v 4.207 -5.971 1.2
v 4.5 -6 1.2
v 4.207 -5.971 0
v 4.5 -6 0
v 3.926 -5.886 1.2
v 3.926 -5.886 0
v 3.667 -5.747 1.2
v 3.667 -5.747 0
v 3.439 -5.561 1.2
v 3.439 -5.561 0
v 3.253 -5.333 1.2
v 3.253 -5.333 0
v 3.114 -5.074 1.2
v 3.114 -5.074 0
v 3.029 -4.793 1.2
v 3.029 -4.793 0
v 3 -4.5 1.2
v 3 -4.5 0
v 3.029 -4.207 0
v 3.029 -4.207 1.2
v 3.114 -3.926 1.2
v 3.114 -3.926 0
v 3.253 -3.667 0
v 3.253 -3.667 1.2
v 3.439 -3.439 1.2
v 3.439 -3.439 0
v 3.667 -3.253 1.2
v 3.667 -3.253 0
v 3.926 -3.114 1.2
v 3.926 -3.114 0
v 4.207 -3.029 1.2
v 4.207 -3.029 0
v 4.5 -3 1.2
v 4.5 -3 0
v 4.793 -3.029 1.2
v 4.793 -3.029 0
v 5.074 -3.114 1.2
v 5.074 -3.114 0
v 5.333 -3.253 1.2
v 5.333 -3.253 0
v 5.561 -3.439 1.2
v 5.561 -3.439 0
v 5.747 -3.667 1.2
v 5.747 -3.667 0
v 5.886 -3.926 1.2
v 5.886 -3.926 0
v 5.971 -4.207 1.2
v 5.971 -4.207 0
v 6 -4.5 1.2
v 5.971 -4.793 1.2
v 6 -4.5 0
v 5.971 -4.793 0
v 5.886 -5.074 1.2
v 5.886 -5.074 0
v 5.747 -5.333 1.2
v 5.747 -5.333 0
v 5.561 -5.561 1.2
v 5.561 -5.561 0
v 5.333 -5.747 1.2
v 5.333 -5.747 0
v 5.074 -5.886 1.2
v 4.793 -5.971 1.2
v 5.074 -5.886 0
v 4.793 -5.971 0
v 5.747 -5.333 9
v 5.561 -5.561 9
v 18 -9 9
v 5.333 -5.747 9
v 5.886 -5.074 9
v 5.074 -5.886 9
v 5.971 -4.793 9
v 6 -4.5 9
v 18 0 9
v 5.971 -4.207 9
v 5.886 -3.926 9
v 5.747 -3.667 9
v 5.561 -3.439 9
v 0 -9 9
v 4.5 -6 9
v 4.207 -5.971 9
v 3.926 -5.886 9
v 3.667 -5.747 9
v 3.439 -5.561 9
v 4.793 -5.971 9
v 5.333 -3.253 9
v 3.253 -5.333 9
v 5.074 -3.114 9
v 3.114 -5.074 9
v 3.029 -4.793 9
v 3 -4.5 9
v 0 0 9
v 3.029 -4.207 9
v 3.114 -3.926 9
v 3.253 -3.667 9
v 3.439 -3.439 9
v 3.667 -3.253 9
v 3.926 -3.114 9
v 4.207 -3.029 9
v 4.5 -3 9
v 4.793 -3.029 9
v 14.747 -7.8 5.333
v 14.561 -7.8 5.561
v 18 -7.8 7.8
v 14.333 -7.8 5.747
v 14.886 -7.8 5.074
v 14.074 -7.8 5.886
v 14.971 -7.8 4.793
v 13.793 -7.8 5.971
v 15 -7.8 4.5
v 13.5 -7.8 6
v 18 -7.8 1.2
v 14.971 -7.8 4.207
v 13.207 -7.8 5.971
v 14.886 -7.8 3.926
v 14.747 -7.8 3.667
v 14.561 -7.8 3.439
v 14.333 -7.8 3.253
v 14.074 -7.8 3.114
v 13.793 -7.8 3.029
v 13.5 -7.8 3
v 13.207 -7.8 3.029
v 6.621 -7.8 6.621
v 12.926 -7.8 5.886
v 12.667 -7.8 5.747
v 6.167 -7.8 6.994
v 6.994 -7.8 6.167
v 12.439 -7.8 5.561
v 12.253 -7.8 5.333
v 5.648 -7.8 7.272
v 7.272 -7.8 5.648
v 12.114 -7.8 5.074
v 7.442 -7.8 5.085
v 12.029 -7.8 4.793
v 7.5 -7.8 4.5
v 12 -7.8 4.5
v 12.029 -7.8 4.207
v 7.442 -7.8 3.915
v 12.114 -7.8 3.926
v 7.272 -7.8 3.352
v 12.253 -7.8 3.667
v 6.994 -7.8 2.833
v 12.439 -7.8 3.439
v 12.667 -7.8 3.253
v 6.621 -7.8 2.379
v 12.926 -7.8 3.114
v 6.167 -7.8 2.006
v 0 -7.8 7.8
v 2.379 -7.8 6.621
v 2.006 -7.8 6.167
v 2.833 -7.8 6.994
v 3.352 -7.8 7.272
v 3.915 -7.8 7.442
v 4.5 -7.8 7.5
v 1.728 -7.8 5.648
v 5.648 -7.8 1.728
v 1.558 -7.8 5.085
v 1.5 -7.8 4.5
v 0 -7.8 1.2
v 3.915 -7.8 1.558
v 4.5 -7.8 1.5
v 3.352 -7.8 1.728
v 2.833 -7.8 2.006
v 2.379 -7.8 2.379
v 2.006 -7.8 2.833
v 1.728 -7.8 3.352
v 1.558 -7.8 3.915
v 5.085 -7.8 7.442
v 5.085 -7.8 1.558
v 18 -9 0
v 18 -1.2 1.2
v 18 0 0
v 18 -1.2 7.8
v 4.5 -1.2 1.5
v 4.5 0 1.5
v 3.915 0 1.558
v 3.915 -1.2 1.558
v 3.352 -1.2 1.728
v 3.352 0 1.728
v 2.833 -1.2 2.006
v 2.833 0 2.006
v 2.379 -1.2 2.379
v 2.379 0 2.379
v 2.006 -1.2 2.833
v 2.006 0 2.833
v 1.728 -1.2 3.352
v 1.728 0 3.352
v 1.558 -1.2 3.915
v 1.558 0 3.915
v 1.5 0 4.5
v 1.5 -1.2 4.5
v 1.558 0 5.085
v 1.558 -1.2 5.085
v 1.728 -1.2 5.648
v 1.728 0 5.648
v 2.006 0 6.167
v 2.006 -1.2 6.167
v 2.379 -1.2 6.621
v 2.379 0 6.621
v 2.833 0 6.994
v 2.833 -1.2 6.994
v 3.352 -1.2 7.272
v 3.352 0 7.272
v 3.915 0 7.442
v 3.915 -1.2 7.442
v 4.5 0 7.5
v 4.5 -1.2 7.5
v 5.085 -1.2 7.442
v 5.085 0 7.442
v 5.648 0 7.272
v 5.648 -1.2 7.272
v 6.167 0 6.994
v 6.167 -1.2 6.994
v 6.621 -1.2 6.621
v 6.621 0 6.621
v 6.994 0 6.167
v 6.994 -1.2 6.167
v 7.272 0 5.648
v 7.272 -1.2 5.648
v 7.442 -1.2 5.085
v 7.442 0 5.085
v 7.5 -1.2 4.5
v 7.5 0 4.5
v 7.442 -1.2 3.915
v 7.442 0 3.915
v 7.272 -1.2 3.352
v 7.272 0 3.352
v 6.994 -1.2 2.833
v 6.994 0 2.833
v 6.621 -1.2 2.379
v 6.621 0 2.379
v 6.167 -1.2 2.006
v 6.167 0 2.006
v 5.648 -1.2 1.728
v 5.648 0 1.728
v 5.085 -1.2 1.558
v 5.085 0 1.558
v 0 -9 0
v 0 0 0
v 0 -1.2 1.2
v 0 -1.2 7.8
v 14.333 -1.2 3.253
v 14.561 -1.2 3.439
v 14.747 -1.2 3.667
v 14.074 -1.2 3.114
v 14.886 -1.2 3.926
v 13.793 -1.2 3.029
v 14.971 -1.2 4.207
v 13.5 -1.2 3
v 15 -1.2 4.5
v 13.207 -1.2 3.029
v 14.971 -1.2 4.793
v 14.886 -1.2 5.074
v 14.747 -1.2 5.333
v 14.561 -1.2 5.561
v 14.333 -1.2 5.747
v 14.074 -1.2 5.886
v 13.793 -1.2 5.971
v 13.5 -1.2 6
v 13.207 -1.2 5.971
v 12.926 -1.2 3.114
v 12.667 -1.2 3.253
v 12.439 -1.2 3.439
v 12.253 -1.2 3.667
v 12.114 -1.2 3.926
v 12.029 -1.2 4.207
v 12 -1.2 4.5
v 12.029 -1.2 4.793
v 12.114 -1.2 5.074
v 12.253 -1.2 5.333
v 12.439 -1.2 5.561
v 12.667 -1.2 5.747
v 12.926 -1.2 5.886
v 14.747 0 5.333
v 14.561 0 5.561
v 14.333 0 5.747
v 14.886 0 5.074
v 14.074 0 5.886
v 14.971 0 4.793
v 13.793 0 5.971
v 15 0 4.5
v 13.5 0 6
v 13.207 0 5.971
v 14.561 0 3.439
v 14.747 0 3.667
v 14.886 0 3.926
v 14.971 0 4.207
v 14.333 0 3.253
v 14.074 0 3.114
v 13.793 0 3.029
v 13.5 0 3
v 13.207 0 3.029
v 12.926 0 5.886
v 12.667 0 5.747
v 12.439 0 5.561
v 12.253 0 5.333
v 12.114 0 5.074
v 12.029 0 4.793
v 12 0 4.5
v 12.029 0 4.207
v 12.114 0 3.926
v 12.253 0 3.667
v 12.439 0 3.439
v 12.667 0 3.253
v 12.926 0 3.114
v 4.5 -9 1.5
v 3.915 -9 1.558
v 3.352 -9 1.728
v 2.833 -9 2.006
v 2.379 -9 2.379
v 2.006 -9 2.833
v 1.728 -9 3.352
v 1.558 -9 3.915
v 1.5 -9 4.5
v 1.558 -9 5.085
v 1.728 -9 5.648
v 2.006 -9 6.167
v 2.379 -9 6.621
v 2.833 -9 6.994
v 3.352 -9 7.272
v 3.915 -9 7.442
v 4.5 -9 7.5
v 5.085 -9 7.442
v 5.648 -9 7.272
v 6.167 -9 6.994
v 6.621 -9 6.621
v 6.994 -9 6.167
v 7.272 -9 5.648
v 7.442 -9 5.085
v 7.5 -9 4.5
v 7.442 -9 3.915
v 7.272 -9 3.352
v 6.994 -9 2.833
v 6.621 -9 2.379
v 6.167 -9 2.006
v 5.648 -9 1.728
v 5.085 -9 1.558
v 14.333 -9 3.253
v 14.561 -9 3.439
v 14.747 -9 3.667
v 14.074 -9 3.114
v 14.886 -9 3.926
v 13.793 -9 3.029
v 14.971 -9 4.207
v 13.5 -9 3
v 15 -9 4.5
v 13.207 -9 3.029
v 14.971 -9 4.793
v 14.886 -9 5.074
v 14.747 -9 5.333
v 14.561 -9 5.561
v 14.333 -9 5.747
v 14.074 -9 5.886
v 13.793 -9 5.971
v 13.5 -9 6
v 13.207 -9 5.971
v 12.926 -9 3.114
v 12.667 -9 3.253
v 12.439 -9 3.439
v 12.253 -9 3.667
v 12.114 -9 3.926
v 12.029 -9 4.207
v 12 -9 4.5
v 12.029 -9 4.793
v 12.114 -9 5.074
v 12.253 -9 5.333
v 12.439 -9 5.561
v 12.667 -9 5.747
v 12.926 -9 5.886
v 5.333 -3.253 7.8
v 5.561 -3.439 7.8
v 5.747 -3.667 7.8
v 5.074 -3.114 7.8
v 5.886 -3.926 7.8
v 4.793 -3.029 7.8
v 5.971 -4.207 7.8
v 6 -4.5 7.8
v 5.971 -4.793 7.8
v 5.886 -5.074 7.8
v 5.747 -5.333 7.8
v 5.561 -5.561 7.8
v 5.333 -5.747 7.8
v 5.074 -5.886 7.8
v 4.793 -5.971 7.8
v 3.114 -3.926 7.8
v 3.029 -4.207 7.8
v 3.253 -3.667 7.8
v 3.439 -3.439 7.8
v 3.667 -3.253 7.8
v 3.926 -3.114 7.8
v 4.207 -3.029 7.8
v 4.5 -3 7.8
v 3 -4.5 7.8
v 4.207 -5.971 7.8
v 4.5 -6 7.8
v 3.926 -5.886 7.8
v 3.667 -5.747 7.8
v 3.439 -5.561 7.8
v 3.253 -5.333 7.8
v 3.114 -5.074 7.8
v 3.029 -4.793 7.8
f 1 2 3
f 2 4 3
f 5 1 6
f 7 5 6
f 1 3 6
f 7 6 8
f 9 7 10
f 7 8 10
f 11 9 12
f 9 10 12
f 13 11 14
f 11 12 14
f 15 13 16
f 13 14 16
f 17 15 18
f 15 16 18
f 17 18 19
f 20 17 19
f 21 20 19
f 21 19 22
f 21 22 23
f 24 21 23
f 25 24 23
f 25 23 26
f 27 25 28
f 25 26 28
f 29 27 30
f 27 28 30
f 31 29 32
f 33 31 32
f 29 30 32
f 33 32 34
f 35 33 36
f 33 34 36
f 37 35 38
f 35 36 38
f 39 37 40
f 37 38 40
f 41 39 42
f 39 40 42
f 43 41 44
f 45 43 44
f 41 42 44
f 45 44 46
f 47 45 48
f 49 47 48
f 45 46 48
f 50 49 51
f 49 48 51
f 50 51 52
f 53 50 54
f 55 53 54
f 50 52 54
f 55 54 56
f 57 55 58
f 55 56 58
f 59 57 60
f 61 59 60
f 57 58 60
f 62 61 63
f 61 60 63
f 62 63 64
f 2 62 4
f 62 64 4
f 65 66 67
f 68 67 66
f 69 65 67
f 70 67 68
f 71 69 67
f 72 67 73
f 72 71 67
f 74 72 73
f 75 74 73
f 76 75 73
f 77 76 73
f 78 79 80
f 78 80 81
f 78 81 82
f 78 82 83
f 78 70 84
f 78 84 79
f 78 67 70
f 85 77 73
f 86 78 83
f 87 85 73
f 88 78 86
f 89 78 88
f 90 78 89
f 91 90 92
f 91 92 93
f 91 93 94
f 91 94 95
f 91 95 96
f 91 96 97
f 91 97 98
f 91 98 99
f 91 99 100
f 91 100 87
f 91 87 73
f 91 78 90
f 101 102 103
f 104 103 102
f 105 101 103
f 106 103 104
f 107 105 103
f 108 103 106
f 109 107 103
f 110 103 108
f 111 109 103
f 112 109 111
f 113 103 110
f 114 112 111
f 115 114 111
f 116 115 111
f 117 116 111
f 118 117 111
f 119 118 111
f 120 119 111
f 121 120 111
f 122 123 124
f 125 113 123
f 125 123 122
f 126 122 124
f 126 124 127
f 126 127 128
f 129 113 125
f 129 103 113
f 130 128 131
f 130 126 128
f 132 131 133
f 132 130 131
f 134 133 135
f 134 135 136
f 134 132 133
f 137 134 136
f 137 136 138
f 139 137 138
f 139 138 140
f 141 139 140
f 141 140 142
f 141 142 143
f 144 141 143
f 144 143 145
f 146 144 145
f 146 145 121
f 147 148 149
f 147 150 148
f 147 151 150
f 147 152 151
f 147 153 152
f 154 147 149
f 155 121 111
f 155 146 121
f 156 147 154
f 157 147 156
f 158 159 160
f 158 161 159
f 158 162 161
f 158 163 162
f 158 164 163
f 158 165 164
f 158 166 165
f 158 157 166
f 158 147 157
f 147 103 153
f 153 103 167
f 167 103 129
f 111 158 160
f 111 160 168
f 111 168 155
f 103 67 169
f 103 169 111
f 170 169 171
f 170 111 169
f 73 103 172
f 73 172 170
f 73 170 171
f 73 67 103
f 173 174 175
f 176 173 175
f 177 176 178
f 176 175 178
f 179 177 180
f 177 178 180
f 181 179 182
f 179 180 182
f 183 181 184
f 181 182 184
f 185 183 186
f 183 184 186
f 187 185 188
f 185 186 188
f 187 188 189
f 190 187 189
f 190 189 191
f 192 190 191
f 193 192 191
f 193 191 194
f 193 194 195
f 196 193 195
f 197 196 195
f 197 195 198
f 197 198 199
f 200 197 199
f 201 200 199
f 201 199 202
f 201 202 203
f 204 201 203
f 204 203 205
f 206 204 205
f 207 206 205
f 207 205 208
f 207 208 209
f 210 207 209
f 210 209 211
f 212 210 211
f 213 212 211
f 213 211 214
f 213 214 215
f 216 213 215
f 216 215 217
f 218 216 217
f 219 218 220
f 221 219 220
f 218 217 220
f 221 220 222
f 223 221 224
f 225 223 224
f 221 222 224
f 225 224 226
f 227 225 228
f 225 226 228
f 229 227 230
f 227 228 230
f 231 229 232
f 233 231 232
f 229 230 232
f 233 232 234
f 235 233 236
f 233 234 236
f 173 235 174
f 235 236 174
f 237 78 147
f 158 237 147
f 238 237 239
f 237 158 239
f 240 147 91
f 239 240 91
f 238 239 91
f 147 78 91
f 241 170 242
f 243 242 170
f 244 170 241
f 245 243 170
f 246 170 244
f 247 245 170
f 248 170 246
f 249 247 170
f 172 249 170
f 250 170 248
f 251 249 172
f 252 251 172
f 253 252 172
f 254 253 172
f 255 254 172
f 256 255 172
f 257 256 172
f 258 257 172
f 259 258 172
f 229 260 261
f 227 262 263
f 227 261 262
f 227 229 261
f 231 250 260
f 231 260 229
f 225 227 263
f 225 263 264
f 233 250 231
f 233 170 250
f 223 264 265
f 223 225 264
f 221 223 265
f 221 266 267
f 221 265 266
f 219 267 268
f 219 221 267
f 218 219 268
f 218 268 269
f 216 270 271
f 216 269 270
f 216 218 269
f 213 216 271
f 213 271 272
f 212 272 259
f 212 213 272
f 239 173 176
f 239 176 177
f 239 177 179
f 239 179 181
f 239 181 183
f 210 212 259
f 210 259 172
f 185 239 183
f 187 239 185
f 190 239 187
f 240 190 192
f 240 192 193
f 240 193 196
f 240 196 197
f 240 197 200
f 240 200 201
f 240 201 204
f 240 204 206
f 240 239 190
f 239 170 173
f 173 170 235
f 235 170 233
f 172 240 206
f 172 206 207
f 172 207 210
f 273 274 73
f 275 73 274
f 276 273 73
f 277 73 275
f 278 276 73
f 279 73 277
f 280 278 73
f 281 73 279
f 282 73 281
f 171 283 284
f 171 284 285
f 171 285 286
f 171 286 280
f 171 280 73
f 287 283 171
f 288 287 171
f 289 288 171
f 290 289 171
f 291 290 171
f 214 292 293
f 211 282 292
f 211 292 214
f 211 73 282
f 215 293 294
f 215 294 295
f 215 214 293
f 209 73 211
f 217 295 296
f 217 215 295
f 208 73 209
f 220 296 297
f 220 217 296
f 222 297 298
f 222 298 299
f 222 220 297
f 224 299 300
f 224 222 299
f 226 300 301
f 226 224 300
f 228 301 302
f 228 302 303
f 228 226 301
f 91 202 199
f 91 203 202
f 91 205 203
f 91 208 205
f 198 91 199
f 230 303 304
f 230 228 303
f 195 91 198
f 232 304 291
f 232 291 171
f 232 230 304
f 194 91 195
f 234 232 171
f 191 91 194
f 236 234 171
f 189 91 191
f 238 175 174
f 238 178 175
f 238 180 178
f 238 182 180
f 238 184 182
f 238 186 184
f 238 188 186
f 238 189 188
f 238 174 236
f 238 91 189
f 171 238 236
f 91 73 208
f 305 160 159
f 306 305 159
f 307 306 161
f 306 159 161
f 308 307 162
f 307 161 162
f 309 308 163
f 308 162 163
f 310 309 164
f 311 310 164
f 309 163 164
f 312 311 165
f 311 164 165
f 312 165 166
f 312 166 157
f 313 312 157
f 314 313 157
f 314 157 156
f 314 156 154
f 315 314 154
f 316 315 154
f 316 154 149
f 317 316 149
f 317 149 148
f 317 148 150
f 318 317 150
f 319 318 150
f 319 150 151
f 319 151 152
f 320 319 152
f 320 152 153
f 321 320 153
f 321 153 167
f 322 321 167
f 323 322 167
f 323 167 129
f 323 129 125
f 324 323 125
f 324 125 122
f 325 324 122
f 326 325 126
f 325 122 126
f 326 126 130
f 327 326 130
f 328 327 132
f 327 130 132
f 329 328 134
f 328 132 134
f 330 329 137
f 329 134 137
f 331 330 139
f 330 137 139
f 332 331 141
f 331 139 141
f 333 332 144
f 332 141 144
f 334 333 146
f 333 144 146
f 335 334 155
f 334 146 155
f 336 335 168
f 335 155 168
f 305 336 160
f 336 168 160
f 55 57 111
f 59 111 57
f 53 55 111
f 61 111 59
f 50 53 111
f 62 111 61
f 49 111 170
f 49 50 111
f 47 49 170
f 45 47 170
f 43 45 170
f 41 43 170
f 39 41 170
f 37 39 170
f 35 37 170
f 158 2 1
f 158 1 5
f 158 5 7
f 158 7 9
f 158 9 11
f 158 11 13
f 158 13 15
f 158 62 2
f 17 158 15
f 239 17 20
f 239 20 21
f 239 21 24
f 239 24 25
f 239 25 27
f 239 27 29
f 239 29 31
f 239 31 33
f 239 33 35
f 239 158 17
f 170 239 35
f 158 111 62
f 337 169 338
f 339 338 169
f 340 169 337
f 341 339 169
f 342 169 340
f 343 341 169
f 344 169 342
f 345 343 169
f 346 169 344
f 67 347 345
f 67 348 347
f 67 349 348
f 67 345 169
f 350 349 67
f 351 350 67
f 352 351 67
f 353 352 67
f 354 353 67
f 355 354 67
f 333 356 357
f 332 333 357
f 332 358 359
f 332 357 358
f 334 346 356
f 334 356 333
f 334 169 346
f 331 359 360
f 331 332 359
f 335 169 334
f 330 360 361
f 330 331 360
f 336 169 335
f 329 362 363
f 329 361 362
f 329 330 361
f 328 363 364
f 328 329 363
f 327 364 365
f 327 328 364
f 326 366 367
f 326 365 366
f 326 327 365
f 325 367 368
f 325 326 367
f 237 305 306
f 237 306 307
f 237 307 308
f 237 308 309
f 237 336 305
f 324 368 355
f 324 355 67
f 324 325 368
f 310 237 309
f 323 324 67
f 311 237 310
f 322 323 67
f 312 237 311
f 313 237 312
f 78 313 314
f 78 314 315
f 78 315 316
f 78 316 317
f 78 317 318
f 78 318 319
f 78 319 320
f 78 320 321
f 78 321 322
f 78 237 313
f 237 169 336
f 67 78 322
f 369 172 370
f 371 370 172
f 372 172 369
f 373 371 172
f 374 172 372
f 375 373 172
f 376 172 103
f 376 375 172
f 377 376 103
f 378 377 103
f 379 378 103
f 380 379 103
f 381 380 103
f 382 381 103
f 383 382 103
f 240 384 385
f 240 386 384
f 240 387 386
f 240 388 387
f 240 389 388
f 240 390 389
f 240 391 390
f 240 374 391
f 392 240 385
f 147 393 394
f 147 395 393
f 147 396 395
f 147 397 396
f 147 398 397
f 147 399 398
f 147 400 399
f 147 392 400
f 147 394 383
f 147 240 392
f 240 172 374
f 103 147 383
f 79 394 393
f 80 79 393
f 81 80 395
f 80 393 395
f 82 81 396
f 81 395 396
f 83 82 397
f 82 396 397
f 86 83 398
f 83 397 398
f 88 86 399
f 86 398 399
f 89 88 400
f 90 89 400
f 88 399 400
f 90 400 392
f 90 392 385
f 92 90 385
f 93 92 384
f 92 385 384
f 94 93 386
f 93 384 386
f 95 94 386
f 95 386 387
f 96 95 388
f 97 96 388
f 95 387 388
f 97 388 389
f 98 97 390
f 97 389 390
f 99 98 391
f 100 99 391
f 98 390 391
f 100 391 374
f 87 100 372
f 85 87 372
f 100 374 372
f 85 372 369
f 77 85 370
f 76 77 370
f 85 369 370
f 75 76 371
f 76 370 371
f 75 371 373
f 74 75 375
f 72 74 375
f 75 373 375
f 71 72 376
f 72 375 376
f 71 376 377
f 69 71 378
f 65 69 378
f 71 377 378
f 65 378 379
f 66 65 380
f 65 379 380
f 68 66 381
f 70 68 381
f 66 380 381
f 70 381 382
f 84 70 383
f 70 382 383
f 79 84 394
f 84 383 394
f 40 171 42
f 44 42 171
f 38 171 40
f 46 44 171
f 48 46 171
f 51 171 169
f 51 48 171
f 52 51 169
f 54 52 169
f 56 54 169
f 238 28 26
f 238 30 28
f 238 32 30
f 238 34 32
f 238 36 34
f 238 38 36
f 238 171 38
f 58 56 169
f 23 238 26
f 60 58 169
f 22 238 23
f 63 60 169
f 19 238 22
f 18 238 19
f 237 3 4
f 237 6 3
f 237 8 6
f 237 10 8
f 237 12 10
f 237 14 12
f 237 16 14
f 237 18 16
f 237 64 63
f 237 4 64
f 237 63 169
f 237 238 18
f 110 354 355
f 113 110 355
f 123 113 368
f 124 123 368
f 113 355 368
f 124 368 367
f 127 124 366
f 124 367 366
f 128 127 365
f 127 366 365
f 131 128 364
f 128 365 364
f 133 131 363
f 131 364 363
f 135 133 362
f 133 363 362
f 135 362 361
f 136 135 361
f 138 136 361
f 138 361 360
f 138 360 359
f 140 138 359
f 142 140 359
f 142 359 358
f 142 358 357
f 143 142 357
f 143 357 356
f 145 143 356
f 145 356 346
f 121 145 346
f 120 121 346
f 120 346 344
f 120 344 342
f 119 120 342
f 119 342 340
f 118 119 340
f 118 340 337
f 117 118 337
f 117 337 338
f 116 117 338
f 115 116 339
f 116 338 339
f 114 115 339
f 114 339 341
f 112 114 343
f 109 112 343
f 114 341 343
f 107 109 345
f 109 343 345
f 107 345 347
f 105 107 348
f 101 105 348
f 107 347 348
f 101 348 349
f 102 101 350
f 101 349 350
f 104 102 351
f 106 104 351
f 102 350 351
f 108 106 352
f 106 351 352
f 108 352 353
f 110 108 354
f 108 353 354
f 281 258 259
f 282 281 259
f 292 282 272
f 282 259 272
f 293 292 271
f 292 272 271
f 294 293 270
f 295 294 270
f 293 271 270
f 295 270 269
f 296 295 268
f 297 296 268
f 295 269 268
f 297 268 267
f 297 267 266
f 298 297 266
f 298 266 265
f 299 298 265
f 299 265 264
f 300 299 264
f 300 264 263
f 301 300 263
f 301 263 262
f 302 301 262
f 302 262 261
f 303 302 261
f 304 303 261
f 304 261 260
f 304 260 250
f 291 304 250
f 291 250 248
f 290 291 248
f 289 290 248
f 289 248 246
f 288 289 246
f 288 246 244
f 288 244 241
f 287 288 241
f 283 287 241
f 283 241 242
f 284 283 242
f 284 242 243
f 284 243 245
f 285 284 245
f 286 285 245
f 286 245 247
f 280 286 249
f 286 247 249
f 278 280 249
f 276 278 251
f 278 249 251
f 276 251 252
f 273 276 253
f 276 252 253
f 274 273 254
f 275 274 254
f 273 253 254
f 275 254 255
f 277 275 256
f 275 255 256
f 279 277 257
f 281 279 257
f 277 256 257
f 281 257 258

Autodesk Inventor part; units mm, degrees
ref_plane "YZ Plane" through (0, 0, 0) normal (1, 0, 0) x (0, 1, 0)
ref_plane "XZ Plane" through (0, 0, 0) normal (0, 1, 0) x (-1, 0, 0)
ref_plane "XY Plane" through (0, 0, 0) normal (0, 0, 1) x (1, 0, 0)
sketch "スケッチ1" plane through (0, 0, 0) normal (1, 0, 0) x (0, 1, 0)
  line L0 (0, 0) -> (-9, 0)
  line L1 (-9, 0) -> (-9, 9)
  line L2 (-9, 9) -> (0, 9)
  line L3 (0, 9) -> (0, 0)
  line L4 (-1.2, 7.8) -> (-7.8, 7.8)
  line L5 (-7.8, 7.8) -> (-7.8, 1.2)
  line L6 (-7.8, 1.2) -> (-1.2, 1.2)
  line L7 (-1.2, 1.2) -> (-1.2, 7.8)
  dimension "d0" = 9
  dimension "d1" = 9
  dimension "d2" = 6.6
  dimension "d3" = 6.6
  dimension "d4" = 1.2
  dimension "d5" = 6.6
  dimension "d6" = 1.2
extrude "押し出し1" add sketch "スケッチ1" along normal blind 18
sketch "スケッチ2" plane through (0, -9, 9) normal (0, 0, 1) x (1, 0, 0)
  line L0 (0, 9) -> (0, 0) projected
  line L1 (0, 9) -> (18, 9) projected
  point P0 (4.5, 4.5)
  dimension "d9" = 4.5
  dimension "d10" = 4.5
hole "穴1" at (4.5, -4.5, 9) direction (0, 0, -1) diameter 3 end through all
sketch "スケッチ3" plane through (0, 0, 9) normal (0, 1, 0) x (1, 0, 0)
  line L0 (18, 9) -> (18, 0) projected
  line L1 (0, 9) -> (18, 9) projected
  point P0 (13.5, 4.5)
  dimension "d18" = 4.5
  dimension "d19" = 4.5
hole "穴2" at (13.5, 0, 4.5) direction (0, -1, 0) diameter 3 end through all
sketch "スケッチ4" plane through (0, -9, 0) normal (0, -1, 0) x (1, 0, 0)
  line L0 (0, 9) -> (0, 0) projected
  line L1 (0, 0) -> (18, 0) projected
  point P0 (4.5, 4.5)
  dimension "d27" = 4.5
  dimension "d28" = 4.5
hole "穴3" at (4.5, -9, 4.5) direction (0, 1, 0) diameter 6 end through all
equation "\"d28\" = d27"
properties part number "上下直動9x9x18" material "アルミニウム 6061"
